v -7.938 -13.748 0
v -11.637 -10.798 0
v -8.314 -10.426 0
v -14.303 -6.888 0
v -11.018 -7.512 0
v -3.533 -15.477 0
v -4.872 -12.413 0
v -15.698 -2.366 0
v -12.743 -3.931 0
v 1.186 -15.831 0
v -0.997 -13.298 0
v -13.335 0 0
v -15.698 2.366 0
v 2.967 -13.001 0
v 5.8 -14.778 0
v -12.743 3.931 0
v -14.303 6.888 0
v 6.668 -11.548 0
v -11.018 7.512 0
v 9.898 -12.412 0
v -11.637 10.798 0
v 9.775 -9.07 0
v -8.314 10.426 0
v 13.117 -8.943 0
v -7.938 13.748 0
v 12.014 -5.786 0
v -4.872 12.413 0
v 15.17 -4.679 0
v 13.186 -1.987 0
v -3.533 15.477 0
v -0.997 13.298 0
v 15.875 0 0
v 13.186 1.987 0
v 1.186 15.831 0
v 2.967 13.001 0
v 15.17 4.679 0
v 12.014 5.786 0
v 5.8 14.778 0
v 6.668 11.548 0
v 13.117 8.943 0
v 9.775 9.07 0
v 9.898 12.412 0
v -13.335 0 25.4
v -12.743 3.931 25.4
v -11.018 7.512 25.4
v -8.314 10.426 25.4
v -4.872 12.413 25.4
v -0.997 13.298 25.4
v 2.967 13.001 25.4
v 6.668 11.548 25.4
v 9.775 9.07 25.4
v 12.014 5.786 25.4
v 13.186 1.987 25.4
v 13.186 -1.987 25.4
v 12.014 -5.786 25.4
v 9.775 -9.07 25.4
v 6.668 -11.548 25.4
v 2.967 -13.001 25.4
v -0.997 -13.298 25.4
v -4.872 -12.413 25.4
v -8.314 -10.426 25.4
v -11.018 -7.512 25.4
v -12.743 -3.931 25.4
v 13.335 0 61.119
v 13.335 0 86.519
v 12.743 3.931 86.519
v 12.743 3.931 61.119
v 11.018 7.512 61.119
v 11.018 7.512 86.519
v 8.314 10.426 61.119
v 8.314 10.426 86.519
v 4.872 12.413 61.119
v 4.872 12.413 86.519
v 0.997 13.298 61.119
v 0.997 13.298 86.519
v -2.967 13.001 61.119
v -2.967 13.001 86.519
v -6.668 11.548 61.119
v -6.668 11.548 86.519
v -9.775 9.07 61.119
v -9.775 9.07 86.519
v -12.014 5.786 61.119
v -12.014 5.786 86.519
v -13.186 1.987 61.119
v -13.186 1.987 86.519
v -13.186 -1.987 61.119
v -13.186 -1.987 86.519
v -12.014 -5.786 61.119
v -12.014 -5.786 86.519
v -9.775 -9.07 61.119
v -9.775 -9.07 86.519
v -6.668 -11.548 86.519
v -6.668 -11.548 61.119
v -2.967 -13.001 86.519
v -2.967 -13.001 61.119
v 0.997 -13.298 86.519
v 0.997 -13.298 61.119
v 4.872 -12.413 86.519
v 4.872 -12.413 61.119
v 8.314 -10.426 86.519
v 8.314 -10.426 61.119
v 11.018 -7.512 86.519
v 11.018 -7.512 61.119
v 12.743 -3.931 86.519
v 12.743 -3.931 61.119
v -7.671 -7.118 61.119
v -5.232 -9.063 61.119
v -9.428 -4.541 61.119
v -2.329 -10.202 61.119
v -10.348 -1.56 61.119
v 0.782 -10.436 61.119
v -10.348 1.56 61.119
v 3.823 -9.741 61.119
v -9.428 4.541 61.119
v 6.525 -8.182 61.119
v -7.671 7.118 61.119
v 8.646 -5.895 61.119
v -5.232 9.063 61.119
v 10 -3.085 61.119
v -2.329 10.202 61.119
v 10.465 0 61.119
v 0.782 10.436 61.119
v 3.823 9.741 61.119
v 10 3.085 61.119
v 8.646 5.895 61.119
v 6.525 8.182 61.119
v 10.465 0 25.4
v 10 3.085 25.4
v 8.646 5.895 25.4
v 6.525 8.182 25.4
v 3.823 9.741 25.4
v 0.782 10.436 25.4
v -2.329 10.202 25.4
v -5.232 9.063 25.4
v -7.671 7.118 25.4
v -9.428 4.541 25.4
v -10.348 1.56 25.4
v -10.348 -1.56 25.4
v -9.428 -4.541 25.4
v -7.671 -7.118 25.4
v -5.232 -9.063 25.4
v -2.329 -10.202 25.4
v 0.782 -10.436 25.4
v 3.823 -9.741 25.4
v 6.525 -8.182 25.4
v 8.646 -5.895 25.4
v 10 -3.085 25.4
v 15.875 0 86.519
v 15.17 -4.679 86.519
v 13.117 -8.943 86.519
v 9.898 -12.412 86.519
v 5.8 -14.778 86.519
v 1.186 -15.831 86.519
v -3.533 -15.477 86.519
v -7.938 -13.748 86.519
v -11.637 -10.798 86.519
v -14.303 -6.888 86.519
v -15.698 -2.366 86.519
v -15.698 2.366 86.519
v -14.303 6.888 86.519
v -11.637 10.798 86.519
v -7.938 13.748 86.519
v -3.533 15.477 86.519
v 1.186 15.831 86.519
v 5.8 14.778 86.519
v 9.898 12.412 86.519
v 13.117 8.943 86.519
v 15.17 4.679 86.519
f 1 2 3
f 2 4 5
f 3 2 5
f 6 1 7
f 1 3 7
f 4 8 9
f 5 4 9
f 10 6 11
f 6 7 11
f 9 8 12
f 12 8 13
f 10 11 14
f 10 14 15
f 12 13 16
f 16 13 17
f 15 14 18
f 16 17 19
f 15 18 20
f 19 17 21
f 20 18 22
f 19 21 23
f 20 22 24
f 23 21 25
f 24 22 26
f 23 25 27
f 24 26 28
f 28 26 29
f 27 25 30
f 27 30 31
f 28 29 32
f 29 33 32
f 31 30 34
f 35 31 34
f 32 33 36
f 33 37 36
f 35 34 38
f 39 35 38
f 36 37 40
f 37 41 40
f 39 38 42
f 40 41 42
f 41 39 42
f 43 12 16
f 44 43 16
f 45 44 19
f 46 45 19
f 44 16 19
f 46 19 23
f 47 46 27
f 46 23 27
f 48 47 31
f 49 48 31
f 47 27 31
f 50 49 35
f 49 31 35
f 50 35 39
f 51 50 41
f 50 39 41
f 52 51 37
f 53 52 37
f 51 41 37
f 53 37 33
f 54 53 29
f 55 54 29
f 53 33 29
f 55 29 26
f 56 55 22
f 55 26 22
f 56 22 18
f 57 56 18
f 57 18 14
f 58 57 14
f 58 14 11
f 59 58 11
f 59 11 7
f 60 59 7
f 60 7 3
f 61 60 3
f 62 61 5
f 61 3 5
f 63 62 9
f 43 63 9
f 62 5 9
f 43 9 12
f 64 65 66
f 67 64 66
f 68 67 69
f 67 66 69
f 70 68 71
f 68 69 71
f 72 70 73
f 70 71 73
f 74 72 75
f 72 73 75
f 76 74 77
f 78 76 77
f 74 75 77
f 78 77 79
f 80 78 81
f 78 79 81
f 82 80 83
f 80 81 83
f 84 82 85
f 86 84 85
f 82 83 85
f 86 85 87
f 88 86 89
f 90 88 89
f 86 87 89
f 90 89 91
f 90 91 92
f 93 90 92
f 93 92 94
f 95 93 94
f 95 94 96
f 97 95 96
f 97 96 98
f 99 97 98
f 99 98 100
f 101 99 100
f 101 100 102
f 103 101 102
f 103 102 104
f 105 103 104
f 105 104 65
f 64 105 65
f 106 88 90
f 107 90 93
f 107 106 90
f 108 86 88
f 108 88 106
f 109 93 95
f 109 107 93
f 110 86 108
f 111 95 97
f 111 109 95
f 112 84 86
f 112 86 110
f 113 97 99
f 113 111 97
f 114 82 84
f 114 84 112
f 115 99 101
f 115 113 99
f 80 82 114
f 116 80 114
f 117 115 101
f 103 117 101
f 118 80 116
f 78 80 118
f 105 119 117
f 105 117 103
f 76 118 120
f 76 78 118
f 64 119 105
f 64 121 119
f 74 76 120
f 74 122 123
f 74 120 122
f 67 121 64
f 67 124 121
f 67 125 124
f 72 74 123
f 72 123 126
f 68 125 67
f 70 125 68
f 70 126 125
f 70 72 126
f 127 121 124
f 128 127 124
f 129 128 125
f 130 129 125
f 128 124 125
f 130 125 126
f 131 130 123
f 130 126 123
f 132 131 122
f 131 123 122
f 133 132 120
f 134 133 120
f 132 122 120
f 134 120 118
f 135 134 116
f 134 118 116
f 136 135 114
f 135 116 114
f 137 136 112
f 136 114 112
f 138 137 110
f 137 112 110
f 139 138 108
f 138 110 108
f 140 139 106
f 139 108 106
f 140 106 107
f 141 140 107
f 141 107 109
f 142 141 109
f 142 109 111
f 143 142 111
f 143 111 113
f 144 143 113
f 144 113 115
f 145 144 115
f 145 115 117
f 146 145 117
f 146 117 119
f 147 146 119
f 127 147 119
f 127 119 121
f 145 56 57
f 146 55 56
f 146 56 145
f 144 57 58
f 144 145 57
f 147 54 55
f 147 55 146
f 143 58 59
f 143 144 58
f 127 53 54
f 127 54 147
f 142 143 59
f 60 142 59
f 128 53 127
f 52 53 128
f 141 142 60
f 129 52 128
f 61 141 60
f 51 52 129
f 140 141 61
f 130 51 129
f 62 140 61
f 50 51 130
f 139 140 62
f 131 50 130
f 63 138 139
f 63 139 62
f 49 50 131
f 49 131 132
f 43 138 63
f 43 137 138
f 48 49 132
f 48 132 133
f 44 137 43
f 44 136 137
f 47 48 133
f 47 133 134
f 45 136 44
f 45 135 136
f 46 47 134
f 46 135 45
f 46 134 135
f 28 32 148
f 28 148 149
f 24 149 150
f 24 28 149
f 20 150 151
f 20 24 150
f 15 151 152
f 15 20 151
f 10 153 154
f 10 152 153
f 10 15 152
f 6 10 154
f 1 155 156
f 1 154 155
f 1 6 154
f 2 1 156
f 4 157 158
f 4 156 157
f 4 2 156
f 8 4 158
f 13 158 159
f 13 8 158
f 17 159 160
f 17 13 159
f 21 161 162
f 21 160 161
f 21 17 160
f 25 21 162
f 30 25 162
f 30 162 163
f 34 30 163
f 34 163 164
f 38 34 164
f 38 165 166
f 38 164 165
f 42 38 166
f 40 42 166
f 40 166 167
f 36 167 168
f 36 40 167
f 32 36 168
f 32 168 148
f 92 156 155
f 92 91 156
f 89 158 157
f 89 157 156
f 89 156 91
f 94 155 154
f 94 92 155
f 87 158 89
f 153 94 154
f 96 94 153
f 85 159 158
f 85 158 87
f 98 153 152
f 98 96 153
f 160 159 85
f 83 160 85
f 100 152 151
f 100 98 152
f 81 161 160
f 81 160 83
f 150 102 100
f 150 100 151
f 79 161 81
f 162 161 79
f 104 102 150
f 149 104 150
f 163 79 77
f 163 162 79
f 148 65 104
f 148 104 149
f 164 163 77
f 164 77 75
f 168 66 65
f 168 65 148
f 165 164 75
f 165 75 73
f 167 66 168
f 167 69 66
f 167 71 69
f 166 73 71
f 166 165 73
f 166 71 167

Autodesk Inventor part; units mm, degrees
ref_plane "YZ Plane" through (0, 0, 0) normal (1, 0, 0) x (0, 1, 0)
ref_plane "XZ Plane" through (0, 0, 0) normal (0, 1, 0) x (-1, 0, 0)
ref_plane "XY Plane" through (0, 0, 0) normal (0, 0, 1) x (1, 0, 0)
sketch "Sketch1" plane through (0, 0, 0) normal (0, 0, 1) x (1, 0, 0)
  circle A0 centre (0, 0) radius 15.875
  dimension "d0" = 31.75
extrude "mainBody" add sketch "Sketch1" along normal blind 86.5188
sketch "Sketch14" plane through (0, 0, 86.5188) normal (0, 0, 1) x (1, 0, 0)
  circle A0 centre (0, 0) radius 15.875 projected
  circle A1 centre (0, 0) radius 10.4648
  dimension "d43" = 20.9296
extrude "mainTube" cut sketch "Sketch14" against normal blind 177.8 contours A1
sketch "Sketch15" plane through (0, 0, 86.5188) normal (0, 0, 1) x (1, 0, 0)
  circle A0 centre (0, 0) radius 10.4648 projected
  circle A1 centre (0, 0) radius 15.875 projected
  circle A2 centre (0, 0) radius 13.335
  dimension "d47" = 26.67
extrude "mainSocket1" cut sketch "Sketch15" against normal blind 25.4 contours A2
sketch "Sketch16" plane through (0, 0, 0) normal (0, 0, -1) x (-1, 0, 0)
  circle A0 centre (0, 0) radius 10.4648 projected
  circle A1 centre (0, 0) radius 15.875 projected
  circle A2 centre (0, 0) radius 13.335
  dimension "d51" = 26.67
extrude "mainSocket2" cut sketch "Sketch16" against normal blind 25.4 contours A2
properties part number "0pvc_T_0.75" material "PVC-Piping"
